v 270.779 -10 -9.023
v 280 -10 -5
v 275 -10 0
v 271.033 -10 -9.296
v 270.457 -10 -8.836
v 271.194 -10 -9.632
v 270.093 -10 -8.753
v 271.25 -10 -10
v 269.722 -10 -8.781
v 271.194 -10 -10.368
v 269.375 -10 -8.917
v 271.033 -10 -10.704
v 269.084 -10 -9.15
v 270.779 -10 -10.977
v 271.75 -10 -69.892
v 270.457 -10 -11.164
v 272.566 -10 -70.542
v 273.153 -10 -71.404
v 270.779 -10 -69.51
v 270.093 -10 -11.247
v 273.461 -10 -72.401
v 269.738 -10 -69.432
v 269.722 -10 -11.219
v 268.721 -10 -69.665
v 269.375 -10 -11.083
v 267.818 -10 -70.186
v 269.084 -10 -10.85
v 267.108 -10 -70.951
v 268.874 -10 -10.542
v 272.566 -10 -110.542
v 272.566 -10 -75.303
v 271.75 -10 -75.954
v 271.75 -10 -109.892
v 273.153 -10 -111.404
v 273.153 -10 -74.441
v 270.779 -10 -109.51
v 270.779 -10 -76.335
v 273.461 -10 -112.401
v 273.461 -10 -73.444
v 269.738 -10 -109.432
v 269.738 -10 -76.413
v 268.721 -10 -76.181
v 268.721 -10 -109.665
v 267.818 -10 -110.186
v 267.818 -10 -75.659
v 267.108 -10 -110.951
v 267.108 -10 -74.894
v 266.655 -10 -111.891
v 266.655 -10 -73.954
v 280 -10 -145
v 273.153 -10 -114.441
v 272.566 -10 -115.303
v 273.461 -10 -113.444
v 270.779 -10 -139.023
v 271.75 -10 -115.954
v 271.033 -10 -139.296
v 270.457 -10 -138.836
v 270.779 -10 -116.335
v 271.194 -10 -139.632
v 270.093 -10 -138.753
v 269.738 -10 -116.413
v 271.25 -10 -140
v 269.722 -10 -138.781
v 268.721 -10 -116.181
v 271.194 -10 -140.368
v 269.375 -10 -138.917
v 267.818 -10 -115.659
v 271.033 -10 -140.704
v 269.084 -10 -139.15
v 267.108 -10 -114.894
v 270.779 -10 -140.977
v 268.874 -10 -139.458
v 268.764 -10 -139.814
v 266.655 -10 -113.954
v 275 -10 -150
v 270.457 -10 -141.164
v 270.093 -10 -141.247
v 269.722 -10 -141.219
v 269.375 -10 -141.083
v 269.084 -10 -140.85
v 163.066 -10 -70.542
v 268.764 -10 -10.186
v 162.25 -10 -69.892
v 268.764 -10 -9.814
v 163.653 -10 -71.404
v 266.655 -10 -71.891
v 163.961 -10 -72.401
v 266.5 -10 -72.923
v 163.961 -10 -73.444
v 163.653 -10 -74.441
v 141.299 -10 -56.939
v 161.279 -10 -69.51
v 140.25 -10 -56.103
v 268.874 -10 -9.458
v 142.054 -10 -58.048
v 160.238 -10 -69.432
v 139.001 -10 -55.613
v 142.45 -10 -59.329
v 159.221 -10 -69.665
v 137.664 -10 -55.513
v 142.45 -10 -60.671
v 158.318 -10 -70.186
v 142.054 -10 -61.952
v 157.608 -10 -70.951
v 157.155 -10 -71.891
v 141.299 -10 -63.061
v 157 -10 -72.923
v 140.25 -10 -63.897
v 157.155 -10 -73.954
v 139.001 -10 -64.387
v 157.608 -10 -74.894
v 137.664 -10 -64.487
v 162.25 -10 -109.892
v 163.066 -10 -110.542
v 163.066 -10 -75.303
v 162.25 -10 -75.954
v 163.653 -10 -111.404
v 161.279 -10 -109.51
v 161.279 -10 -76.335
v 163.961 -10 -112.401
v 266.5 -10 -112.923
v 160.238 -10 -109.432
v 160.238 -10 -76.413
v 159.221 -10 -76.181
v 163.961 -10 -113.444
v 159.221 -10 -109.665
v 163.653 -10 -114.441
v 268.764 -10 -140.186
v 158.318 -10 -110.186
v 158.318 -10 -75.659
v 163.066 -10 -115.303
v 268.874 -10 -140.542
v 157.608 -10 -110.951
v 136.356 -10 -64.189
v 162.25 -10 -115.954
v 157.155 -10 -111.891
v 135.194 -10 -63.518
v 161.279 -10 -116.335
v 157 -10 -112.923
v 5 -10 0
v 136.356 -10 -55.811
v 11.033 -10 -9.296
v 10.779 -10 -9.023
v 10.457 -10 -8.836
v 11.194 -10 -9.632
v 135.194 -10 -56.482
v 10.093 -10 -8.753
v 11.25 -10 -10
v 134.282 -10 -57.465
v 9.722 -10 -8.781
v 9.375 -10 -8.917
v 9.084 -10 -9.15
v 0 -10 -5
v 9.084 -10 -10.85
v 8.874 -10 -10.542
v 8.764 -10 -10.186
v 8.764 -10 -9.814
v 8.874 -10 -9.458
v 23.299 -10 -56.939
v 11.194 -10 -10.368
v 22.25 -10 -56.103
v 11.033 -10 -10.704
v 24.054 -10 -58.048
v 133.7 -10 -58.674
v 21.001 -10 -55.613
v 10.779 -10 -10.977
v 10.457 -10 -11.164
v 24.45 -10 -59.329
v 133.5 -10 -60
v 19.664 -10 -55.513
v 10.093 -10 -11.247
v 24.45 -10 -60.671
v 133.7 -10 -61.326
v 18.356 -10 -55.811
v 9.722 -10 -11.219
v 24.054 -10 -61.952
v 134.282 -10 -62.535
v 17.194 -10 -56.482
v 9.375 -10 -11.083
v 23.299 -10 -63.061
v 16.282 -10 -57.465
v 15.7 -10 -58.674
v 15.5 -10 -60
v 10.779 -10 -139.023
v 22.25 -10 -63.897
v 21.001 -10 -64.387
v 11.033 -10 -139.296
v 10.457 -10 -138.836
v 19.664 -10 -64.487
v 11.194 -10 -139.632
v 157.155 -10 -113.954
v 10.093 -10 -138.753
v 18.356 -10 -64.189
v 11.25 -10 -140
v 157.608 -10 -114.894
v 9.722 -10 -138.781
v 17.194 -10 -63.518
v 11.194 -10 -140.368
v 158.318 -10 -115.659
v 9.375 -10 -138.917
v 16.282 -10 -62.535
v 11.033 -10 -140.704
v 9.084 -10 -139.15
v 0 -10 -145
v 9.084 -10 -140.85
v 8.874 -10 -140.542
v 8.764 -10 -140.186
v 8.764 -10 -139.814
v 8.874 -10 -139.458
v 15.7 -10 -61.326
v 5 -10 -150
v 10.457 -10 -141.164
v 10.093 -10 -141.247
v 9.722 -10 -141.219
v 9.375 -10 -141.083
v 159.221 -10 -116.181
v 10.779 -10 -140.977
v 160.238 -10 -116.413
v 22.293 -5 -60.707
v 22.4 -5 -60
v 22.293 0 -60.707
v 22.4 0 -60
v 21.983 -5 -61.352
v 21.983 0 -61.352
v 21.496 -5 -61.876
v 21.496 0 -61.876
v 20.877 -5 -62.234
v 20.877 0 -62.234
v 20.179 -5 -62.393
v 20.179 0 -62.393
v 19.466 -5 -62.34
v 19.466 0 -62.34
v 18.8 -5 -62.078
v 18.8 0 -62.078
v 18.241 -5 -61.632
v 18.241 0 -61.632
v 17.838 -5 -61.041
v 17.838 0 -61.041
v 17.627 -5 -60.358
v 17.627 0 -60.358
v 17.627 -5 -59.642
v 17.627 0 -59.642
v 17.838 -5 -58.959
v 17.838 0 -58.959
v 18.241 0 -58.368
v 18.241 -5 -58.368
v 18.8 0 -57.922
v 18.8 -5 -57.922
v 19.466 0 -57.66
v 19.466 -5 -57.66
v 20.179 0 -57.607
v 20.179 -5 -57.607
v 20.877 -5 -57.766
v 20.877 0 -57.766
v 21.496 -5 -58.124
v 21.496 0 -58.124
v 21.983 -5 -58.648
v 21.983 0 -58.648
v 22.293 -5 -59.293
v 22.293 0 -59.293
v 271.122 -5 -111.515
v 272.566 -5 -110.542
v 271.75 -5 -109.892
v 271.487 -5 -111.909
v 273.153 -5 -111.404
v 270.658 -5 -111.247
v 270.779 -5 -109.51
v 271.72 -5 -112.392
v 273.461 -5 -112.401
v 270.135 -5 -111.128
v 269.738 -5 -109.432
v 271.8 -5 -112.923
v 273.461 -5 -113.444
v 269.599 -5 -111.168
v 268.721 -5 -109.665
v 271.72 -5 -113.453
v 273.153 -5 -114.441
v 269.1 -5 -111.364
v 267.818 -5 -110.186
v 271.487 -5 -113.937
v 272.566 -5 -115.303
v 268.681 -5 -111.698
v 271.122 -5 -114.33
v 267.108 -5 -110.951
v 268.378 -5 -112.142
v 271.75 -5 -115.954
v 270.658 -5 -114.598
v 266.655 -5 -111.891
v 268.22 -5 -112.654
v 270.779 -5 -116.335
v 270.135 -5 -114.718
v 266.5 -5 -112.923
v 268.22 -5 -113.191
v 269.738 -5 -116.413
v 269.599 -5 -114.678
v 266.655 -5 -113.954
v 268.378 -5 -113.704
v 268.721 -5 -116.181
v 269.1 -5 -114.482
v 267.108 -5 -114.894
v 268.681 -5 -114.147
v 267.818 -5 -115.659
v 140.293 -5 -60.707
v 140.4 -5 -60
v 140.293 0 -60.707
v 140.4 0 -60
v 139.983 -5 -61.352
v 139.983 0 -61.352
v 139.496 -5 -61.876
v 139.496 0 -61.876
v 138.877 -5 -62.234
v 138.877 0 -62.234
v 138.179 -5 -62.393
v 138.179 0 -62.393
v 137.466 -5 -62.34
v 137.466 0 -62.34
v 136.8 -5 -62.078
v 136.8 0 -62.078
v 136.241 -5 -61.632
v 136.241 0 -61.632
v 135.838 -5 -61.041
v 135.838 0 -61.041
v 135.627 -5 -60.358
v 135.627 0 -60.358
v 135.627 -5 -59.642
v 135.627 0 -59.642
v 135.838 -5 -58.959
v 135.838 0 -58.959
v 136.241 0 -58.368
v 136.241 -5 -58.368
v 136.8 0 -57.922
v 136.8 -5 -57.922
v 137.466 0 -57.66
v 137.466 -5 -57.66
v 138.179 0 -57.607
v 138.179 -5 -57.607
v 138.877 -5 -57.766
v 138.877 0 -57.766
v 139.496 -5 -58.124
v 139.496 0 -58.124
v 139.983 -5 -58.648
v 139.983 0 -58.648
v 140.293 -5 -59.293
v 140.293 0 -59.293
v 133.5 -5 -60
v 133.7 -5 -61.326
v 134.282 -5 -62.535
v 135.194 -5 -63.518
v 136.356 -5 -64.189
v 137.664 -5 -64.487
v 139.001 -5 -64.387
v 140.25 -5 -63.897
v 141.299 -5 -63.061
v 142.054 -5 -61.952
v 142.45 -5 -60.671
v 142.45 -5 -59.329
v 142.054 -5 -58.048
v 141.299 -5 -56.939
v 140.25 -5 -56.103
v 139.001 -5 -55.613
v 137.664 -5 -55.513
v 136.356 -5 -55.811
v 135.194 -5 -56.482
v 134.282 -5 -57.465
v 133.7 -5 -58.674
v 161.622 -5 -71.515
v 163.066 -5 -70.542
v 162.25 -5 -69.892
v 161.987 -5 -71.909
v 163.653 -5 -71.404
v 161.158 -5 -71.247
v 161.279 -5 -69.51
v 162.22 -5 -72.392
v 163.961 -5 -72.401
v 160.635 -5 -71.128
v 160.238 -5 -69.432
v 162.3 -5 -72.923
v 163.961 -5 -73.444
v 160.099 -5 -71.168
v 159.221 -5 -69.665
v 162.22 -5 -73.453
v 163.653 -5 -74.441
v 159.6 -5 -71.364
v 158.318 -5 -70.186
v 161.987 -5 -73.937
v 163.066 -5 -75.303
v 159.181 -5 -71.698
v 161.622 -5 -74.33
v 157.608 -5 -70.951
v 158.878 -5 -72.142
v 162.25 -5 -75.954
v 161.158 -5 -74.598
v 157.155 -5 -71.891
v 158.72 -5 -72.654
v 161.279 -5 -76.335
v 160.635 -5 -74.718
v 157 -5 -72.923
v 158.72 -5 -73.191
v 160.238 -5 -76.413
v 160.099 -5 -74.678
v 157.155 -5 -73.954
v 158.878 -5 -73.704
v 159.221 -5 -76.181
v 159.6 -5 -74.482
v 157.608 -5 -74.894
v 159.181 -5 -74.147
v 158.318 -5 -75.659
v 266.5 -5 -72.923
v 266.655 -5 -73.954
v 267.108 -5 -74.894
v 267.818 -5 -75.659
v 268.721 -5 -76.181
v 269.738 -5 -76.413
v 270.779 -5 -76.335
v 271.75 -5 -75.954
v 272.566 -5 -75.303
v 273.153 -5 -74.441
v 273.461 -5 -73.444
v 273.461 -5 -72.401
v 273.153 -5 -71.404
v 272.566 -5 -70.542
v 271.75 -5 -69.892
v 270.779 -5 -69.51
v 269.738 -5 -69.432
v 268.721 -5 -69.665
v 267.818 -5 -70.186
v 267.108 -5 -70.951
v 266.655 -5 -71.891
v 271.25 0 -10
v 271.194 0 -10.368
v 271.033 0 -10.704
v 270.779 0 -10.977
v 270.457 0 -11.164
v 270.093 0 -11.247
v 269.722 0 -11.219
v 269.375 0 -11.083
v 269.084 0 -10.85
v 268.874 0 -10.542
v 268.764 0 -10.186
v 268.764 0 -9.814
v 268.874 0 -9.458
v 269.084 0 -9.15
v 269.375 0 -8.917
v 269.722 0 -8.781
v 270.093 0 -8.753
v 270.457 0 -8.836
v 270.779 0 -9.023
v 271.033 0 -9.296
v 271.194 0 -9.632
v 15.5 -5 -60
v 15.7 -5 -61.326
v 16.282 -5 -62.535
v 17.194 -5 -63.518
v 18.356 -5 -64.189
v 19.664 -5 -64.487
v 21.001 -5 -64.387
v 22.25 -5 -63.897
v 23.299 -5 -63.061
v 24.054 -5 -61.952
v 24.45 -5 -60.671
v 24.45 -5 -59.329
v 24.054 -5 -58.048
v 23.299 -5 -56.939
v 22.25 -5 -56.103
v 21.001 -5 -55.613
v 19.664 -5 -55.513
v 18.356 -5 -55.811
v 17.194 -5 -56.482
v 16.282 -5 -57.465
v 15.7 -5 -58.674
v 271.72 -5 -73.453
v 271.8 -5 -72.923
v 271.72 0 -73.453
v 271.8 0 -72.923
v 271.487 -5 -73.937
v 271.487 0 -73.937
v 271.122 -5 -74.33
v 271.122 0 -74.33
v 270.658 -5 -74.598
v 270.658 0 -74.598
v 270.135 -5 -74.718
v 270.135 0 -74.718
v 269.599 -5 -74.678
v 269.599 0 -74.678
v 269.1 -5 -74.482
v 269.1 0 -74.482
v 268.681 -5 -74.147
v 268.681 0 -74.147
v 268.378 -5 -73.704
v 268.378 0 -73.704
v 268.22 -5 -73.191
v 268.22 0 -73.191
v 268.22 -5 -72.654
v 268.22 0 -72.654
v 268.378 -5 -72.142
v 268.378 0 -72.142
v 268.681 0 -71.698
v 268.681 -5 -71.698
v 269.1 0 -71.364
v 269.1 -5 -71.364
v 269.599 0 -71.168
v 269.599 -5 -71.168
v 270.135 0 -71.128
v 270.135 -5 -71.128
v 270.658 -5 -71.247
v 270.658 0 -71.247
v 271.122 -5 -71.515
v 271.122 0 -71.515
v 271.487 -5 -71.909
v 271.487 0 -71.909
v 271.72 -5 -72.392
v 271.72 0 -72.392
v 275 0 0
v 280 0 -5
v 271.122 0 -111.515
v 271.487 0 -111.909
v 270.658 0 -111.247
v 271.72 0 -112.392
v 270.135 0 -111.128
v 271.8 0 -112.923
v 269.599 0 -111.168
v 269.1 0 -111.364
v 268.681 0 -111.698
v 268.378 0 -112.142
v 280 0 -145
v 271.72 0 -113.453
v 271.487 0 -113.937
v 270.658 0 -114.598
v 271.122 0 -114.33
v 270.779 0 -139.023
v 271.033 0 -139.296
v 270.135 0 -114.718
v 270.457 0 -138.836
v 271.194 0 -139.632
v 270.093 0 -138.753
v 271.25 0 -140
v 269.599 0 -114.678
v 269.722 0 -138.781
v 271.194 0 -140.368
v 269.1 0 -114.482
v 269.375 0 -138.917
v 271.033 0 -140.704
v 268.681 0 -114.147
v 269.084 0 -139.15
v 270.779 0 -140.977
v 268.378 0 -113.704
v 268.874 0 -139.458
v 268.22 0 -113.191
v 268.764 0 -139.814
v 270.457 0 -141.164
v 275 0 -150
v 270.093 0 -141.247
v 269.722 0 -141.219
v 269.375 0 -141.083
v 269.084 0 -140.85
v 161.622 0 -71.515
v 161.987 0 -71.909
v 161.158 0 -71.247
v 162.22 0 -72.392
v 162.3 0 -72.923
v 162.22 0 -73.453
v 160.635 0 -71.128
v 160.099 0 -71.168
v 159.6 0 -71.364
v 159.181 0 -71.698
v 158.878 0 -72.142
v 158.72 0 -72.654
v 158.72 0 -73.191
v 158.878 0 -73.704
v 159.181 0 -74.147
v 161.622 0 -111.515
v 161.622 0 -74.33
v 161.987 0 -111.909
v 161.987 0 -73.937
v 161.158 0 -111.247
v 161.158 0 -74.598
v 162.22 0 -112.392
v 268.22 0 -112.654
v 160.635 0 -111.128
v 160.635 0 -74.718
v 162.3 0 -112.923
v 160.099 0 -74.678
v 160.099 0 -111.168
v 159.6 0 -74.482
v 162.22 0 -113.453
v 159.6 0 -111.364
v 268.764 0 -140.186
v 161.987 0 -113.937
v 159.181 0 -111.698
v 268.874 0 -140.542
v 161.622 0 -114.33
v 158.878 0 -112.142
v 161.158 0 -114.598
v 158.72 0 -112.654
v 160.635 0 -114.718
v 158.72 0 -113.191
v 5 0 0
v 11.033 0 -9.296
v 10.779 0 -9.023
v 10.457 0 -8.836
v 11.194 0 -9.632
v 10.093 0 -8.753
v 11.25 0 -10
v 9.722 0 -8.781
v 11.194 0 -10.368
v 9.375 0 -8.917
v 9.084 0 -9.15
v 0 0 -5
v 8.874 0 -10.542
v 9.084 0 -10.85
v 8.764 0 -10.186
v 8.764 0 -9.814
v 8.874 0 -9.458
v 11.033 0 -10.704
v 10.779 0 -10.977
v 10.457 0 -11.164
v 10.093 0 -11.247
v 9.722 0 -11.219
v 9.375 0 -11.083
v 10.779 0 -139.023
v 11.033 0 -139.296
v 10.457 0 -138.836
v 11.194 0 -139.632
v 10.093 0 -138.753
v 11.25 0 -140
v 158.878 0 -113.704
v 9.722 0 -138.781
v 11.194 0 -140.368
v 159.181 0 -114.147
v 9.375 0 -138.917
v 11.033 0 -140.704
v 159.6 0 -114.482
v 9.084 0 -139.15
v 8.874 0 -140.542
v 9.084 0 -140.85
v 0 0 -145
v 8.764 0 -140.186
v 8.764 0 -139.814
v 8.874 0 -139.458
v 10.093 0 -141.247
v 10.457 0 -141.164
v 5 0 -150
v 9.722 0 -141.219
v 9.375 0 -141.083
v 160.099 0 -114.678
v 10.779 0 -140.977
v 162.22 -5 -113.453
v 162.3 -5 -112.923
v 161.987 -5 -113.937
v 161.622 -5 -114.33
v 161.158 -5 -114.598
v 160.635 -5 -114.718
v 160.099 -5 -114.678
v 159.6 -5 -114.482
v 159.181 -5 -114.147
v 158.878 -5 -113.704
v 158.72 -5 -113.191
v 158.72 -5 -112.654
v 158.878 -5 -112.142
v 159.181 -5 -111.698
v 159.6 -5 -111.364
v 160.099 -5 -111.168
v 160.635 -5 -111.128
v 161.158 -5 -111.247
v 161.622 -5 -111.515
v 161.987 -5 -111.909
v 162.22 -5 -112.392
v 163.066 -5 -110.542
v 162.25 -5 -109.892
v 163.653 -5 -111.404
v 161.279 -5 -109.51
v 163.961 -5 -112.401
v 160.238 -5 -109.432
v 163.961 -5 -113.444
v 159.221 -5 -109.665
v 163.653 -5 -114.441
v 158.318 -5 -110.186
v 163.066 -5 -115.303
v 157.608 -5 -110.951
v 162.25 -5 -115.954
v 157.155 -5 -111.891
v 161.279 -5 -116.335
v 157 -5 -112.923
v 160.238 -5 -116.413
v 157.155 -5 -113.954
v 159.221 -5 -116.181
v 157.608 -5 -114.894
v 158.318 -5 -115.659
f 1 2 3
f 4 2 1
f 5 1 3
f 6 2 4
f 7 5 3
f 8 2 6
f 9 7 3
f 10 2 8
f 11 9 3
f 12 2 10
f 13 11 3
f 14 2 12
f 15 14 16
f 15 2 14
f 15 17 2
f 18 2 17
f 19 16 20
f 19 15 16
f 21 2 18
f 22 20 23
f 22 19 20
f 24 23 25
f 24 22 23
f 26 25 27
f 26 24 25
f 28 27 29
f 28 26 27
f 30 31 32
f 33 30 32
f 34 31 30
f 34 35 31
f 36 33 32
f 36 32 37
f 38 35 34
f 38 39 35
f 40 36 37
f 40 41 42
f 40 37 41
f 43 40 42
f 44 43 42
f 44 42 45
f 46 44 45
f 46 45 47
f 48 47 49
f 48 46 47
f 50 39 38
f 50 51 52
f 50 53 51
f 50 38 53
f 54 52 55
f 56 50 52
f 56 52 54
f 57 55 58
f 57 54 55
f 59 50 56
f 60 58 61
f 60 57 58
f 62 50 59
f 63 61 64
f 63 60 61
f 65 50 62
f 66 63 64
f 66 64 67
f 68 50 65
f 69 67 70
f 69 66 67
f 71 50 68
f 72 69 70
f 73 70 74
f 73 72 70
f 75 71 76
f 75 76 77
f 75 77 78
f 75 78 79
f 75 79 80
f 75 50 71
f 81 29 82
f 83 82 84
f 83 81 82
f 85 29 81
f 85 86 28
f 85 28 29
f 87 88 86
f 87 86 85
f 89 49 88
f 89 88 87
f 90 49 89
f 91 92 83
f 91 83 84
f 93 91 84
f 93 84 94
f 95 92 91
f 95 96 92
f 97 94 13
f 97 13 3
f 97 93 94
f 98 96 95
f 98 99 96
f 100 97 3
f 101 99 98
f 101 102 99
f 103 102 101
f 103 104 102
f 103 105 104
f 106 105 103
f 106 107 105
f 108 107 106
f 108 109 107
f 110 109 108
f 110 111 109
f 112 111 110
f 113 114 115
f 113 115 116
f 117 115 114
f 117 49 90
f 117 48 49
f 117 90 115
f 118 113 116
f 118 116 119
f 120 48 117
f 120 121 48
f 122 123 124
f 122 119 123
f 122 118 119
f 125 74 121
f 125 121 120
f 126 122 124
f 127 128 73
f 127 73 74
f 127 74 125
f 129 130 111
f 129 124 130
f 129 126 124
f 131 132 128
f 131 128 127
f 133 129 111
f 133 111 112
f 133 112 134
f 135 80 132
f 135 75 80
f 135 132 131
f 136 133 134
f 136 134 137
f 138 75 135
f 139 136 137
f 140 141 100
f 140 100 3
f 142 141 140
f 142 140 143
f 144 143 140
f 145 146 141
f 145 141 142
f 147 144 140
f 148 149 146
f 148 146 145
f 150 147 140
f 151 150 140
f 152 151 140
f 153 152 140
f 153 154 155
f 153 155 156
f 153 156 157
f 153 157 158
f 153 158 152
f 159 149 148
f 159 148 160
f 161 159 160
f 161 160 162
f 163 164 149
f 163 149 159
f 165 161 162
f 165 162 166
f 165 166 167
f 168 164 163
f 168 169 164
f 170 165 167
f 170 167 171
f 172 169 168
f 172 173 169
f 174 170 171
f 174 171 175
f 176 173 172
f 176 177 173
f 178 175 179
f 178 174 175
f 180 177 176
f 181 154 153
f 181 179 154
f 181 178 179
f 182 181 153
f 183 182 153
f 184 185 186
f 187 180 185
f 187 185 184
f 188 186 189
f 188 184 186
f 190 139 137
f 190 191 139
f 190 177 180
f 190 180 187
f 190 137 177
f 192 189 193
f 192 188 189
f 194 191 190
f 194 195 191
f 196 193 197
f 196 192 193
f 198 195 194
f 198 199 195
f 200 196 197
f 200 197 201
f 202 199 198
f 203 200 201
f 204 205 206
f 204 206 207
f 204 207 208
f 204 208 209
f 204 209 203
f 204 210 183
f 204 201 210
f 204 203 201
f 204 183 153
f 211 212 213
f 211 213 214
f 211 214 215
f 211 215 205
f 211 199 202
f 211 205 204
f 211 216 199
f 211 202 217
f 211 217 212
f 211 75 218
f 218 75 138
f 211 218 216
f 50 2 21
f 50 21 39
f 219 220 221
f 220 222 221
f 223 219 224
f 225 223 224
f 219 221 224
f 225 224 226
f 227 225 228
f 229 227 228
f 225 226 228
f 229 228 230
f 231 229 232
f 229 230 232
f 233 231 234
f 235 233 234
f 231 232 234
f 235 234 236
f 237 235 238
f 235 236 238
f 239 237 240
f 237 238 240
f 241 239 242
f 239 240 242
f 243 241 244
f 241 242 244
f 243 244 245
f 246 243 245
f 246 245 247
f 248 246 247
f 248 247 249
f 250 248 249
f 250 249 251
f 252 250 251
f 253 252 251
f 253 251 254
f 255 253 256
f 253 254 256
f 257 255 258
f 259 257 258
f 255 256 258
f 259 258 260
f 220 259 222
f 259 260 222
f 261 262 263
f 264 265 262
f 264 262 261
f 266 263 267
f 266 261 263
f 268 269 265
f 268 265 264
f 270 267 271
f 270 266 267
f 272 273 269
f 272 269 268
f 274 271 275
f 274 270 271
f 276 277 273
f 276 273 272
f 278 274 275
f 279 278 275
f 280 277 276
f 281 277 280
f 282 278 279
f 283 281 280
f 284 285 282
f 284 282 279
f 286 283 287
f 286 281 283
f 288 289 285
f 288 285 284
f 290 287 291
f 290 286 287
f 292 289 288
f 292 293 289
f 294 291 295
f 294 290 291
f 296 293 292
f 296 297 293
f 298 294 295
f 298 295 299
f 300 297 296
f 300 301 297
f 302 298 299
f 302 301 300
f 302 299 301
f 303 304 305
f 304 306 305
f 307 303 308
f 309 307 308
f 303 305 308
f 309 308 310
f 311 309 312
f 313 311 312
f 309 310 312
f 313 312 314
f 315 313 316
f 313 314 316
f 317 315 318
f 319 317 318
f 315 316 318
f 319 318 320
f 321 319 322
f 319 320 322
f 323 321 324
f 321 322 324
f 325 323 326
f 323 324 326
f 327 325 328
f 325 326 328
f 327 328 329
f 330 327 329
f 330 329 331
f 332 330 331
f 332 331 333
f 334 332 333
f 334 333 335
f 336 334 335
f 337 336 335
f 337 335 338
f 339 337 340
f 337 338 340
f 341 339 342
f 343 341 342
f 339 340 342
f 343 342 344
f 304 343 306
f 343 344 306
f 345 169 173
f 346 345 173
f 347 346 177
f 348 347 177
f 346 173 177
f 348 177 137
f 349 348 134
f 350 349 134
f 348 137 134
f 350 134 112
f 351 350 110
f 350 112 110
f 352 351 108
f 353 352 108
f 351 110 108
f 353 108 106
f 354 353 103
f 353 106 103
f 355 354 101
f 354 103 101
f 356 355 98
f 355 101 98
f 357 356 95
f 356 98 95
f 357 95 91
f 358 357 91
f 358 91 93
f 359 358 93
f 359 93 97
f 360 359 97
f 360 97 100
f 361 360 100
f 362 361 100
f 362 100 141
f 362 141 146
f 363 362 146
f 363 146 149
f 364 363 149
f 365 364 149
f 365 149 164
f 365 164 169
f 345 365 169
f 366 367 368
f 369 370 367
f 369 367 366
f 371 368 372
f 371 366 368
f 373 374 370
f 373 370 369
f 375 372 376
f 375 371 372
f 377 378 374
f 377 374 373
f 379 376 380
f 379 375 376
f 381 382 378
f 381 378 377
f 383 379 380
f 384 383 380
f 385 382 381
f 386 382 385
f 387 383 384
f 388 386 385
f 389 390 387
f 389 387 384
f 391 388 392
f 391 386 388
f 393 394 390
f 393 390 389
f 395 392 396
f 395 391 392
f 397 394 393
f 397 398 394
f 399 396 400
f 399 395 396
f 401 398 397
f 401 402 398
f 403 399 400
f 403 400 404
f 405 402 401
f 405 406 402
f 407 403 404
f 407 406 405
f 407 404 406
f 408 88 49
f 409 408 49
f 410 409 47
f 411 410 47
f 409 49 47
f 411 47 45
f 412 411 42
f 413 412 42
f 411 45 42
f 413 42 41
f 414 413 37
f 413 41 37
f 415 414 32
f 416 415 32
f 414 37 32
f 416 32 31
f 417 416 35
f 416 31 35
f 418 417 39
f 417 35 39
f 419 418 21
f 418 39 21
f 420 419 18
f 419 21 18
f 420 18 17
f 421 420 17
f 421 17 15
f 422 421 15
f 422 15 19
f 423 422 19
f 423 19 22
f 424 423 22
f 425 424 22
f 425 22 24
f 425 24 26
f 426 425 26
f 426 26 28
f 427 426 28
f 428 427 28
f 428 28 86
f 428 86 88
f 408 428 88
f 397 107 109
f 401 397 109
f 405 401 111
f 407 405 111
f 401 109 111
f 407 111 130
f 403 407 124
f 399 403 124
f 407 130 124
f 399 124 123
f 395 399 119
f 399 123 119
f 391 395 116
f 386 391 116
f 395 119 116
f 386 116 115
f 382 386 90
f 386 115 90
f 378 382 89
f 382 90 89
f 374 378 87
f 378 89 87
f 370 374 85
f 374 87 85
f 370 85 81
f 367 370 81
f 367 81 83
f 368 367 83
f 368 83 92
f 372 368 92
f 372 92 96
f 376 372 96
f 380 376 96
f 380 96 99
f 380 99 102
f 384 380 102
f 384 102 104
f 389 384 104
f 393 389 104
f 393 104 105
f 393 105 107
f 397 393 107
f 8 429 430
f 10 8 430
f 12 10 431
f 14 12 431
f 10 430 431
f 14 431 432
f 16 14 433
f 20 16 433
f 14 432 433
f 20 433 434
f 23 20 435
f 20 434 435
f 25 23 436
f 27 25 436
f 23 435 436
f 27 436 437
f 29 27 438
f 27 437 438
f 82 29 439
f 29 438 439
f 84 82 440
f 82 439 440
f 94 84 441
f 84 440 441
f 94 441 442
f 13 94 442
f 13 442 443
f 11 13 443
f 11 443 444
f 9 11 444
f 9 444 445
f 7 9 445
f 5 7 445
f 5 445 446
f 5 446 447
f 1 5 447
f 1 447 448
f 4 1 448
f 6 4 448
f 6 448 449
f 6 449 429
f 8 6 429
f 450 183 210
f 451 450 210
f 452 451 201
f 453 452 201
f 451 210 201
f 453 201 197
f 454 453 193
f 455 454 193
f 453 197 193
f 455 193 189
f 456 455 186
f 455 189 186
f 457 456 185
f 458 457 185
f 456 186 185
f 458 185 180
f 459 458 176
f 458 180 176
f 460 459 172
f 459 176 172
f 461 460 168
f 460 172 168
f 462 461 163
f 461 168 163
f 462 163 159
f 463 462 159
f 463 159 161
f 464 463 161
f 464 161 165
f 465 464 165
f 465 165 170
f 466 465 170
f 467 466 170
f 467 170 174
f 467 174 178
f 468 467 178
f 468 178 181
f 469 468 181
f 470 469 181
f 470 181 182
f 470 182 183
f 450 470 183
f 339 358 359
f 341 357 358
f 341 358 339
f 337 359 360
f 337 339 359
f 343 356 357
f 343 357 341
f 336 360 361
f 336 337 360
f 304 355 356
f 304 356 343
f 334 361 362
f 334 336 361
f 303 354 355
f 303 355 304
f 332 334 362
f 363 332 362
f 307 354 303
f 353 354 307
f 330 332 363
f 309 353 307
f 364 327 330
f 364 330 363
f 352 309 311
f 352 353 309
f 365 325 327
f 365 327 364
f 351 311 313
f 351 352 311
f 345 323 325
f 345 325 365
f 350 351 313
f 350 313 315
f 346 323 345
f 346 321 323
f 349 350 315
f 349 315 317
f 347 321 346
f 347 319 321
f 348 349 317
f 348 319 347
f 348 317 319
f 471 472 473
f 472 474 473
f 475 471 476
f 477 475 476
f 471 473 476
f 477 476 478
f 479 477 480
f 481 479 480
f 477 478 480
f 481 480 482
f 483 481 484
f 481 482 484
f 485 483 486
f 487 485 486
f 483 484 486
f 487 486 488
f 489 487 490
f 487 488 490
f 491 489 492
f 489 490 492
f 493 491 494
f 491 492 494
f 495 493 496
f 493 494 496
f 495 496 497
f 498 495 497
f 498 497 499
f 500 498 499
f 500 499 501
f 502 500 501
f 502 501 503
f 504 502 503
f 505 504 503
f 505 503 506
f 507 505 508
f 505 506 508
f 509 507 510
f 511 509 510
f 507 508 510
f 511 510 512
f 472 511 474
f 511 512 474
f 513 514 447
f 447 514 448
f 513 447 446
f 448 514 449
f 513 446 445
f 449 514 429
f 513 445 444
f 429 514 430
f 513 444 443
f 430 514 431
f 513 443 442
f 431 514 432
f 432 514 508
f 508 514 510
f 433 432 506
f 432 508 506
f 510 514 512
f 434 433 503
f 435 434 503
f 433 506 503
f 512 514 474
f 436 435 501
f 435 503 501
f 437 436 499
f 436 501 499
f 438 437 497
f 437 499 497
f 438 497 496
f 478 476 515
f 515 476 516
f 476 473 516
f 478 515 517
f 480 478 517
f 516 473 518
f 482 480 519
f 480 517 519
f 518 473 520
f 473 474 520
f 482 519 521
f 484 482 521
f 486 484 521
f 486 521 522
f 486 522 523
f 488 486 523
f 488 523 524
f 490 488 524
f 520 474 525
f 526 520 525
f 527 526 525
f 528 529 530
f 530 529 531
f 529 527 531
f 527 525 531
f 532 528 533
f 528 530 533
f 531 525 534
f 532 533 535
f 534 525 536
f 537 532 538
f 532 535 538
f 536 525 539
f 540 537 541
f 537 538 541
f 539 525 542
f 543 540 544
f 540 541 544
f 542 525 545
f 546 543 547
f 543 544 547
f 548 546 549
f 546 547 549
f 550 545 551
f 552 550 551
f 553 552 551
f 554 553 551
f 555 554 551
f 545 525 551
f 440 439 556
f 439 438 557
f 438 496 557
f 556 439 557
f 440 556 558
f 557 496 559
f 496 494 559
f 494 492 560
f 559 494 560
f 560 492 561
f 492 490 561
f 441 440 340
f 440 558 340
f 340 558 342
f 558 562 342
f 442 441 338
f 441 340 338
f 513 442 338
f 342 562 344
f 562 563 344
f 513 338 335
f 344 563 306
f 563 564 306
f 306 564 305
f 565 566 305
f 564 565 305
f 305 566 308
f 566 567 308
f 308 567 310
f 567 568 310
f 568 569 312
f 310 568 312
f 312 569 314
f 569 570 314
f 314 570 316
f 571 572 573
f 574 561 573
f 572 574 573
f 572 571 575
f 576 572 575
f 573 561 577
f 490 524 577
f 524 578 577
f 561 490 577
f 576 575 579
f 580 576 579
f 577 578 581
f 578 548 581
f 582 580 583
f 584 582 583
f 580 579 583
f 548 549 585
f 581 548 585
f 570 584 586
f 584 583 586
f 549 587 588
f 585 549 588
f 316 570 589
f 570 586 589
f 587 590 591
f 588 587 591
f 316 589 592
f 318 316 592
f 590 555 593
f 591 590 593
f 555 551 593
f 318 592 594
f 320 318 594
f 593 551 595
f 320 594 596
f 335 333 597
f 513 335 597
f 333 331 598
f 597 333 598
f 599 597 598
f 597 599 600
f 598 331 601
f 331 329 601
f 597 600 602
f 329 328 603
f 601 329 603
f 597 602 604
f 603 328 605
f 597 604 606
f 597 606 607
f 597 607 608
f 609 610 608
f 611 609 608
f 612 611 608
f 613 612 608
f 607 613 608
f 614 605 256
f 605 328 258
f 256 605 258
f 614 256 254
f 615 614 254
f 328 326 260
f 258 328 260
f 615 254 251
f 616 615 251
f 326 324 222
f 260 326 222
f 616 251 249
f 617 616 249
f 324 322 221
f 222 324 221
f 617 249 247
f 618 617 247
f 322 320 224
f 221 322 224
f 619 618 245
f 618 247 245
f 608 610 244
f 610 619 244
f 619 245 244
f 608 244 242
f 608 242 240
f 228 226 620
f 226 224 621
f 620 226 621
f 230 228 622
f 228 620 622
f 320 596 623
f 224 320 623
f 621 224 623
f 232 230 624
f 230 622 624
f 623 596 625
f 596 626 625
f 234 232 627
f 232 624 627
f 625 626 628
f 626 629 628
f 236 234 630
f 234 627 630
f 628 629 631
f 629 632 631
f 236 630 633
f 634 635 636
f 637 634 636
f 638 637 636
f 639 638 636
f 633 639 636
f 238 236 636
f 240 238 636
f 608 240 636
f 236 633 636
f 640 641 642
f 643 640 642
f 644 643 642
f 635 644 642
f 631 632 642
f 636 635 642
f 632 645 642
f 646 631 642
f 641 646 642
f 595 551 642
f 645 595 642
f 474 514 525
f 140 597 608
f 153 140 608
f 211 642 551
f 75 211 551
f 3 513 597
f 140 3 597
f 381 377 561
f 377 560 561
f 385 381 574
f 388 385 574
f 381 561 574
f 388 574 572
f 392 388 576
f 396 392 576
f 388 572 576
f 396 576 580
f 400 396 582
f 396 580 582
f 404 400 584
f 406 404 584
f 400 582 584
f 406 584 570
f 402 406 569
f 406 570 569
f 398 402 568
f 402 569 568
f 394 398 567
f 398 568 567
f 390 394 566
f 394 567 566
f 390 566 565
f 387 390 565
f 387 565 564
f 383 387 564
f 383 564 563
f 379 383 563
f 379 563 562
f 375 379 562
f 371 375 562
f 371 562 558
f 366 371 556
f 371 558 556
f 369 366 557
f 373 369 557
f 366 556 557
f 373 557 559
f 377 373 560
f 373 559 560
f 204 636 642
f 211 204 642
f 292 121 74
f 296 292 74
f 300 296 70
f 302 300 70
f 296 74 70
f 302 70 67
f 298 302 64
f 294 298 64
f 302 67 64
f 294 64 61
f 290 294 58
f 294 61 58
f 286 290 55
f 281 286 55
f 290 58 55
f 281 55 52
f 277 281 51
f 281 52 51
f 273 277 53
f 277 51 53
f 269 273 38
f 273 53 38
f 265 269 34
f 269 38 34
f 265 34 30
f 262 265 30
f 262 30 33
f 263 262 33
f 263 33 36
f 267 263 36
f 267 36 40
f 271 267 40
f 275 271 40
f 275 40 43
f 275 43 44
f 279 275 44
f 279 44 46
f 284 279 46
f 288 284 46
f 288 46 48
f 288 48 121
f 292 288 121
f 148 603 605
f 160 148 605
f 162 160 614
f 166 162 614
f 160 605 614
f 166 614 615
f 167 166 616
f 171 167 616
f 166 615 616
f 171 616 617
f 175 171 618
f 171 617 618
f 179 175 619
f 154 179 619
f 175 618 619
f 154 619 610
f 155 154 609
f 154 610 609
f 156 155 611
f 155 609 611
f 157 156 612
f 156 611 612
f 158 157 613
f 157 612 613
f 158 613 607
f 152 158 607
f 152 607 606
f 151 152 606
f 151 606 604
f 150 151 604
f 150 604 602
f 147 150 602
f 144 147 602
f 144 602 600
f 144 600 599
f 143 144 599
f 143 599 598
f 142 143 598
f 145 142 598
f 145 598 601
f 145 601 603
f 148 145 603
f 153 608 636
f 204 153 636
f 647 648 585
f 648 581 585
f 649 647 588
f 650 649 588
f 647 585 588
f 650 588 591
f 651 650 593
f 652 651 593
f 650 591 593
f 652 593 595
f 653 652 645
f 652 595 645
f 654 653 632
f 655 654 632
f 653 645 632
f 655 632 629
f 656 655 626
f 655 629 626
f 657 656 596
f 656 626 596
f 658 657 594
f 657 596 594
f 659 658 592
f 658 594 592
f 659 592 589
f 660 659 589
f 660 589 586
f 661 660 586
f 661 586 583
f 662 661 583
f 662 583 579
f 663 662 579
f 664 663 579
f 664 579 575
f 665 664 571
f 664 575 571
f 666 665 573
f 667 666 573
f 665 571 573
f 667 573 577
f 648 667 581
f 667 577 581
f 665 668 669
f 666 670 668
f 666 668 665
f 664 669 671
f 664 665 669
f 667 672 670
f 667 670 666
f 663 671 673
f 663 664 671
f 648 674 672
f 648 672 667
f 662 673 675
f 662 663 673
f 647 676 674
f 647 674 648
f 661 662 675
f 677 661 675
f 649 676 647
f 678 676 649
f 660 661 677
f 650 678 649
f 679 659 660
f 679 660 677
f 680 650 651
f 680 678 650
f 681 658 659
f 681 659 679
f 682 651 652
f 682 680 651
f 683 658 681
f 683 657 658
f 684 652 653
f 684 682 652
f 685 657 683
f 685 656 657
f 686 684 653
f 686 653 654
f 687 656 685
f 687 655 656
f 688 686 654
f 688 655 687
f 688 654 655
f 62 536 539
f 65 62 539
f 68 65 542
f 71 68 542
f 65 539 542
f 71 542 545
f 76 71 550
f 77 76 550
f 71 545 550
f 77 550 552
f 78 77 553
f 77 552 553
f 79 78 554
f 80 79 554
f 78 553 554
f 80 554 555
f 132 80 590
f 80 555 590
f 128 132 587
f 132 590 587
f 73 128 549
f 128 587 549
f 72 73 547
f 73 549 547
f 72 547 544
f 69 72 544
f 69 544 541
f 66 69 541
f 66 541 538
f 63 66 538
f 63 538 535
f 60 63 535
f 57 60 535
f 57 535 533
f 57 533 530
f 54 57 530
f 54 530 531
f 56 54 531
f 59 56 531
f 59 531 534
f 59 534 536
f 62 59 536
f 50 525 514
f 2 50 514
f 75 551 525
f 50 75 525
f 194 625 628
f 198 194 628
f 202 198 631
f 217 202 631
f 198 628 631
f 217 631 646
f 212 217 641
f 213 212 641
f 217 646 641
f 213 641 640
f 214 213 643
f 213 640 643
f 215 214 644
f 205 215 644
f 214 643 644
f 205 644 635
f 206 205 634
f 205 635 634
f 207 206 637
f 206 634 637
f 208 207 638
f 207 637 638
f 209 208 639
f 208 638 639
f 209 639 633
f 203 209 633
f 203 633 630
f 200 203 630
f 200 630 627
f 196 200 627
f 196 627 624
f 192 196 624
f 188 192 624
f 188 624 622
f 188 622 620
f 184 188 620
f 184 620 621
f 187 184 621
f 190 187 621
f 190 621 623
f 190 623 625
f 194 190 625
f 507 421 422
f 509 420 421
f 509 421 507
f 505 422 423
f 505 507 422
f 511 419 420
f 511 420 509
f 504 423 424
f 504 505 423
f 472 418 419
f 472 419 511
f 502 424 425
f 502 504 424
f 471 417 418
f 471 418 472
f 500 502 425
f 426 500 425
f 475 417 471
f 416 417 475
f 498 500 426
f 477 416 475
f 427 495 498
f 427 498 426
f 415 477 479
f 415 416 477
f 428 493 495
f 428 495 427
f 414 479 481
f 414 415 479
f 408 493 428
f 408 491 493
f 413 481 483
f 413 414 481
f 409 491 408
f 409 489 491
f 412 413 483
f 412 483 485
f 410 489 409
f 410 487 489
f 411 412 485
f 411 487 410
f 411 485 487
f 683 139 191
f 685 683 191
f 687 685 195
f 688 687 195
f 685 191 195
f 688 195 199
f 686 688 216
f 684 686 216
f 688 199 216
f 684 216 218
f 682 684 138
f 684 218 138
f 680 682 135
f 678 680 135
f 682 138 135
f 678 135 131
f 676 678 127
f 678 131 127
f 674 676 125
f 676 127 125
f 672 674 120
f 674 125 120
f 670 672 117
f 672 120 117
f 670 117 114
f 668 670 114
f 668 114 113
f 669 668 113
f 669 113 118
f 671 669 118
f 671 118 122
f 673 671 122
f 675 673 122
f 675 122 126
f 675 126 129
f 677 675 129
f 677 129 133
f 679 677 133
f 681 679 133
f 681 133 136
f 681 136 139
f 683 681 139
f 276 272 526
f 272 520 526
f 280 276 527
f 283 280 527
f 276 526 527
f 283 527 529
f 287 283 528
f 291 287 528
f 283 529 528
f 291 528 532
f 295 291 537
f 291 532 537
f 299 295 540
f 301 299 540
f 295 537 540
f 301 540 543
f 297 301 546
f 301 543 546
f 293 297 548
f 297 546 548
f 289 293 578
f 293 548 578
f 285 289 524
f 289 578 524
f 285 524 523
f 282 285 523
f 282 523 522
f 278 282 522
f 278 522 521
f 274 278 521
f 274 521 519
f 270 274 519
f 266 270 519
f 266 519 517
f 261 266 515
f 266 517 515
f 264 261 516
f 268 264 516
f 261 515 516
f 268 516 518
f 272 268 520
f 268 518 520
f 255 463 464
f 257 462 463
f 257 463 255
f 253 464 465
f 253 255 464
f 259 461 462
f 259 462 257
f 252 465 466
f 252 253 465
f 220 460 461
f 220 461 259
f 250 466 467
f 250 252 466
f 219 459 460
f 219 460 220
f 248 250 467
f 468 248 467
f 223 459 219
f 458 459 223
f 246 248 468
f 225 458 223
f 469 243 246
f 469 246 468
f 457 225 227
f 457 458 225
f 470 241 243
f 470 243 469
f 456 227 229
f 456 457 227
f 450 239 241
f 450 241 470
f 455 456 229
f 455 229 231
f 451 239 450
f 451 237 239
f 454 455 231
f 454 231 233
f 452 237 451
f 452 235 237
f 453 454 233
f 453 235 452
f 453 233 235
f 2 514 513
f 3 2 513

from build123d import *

# Parameters (mm, degrees)
BOSS_EXTRUDE1_DEPTH                      = 10
CBORE_FOR_M4_PAN_HEAD_SCREW1_D           = 4.8
CBORE_FOR_M4_PAN_HEAD_SCREW1_CBORE_D     = 9
CBORE_FOR_M4_PAN_HEAD_SCREW1_CBORE_DEPTH = 5
M3X0_5_TAPPED_HOLE1_D                    = 2.5
CBORE_FOR_M3_PAN_HEAD_SCREW1_D           = 3.6
CBORE_FOR_M3_PAN_HEAD_SCREW1_CBORE_D     = 7
CBORE_FOR_M3_PAN_HEAD_SCREW1_CBORE_DEPTH = 5


with BuildPart() as part:
    # Sketch1 → Boss-Extrude1 (new body)
    with BuildSketch(Plane(origin=(0, 0, 0), x_dir=(1, 0, 0), z_dir=(0, 1, 0))):
        Polygon((0, 145), (5, 150), (275, 150), (280, 145), (280, 5), (275, 0), (5, 0), (0, 5), align=None)
    extrude(amount=-BOSS_EXTRUDE1_DEPTH)

    # CBORE for M4 Pan Head Screw1 (through all)
    with Locations(Plane(origin=(0, -10, 0), x_dir=(-1, 0, 0), z_dir=(0, -1, 0))):
        with Locations((-138, 60), (-20, 60)):
            CounterBoreHole(CBORE_FOR_M4_PAN_HEAD_SCREW1_D / 2, CBORE_FOR_M4_PAN_HEAD_SCREW1_CBORE_D / 2, CBORE_FOR_M4_PAN_HEAD_SCREW1_CBORE_DEPTH)

    # M3x0.5 Tapped Hole1 (through all)
    with Locations(Plane(origin=(0, -10, 0), x_dir=(-1, 0, 0), z_dir=(0, -1, 0))):
        with Locations((-10, 10), (-10, 140), (-270, 140), (-270, 10)):
            Hole(M3X0_5_TAPPED_HOLE1_D / 2)

    # CBORE for M3 Pan Head Screw1 (through all)
    with Locations(Plane(origin=(0, -10, 0), x_dir=(-1, 0, 0), z_dir=(0, -1, 0))):
        with Locations((-160.5, 112.922675535), (-160.5, 72.922675535), (-270, 112.922675535), (-270, 72.922675535)):
            CounterBoreHole(CBORE_FOR_M3_PAN_HEAD_SCREW1_D / 2, CBORE_FOR_M3_PAN_HEAD_SCREW1_CBORE_D / 2, CBORE_FOR_M3_PAN_HEAD_SCREW1_CBORE_DEPTH)


solid = part.part
